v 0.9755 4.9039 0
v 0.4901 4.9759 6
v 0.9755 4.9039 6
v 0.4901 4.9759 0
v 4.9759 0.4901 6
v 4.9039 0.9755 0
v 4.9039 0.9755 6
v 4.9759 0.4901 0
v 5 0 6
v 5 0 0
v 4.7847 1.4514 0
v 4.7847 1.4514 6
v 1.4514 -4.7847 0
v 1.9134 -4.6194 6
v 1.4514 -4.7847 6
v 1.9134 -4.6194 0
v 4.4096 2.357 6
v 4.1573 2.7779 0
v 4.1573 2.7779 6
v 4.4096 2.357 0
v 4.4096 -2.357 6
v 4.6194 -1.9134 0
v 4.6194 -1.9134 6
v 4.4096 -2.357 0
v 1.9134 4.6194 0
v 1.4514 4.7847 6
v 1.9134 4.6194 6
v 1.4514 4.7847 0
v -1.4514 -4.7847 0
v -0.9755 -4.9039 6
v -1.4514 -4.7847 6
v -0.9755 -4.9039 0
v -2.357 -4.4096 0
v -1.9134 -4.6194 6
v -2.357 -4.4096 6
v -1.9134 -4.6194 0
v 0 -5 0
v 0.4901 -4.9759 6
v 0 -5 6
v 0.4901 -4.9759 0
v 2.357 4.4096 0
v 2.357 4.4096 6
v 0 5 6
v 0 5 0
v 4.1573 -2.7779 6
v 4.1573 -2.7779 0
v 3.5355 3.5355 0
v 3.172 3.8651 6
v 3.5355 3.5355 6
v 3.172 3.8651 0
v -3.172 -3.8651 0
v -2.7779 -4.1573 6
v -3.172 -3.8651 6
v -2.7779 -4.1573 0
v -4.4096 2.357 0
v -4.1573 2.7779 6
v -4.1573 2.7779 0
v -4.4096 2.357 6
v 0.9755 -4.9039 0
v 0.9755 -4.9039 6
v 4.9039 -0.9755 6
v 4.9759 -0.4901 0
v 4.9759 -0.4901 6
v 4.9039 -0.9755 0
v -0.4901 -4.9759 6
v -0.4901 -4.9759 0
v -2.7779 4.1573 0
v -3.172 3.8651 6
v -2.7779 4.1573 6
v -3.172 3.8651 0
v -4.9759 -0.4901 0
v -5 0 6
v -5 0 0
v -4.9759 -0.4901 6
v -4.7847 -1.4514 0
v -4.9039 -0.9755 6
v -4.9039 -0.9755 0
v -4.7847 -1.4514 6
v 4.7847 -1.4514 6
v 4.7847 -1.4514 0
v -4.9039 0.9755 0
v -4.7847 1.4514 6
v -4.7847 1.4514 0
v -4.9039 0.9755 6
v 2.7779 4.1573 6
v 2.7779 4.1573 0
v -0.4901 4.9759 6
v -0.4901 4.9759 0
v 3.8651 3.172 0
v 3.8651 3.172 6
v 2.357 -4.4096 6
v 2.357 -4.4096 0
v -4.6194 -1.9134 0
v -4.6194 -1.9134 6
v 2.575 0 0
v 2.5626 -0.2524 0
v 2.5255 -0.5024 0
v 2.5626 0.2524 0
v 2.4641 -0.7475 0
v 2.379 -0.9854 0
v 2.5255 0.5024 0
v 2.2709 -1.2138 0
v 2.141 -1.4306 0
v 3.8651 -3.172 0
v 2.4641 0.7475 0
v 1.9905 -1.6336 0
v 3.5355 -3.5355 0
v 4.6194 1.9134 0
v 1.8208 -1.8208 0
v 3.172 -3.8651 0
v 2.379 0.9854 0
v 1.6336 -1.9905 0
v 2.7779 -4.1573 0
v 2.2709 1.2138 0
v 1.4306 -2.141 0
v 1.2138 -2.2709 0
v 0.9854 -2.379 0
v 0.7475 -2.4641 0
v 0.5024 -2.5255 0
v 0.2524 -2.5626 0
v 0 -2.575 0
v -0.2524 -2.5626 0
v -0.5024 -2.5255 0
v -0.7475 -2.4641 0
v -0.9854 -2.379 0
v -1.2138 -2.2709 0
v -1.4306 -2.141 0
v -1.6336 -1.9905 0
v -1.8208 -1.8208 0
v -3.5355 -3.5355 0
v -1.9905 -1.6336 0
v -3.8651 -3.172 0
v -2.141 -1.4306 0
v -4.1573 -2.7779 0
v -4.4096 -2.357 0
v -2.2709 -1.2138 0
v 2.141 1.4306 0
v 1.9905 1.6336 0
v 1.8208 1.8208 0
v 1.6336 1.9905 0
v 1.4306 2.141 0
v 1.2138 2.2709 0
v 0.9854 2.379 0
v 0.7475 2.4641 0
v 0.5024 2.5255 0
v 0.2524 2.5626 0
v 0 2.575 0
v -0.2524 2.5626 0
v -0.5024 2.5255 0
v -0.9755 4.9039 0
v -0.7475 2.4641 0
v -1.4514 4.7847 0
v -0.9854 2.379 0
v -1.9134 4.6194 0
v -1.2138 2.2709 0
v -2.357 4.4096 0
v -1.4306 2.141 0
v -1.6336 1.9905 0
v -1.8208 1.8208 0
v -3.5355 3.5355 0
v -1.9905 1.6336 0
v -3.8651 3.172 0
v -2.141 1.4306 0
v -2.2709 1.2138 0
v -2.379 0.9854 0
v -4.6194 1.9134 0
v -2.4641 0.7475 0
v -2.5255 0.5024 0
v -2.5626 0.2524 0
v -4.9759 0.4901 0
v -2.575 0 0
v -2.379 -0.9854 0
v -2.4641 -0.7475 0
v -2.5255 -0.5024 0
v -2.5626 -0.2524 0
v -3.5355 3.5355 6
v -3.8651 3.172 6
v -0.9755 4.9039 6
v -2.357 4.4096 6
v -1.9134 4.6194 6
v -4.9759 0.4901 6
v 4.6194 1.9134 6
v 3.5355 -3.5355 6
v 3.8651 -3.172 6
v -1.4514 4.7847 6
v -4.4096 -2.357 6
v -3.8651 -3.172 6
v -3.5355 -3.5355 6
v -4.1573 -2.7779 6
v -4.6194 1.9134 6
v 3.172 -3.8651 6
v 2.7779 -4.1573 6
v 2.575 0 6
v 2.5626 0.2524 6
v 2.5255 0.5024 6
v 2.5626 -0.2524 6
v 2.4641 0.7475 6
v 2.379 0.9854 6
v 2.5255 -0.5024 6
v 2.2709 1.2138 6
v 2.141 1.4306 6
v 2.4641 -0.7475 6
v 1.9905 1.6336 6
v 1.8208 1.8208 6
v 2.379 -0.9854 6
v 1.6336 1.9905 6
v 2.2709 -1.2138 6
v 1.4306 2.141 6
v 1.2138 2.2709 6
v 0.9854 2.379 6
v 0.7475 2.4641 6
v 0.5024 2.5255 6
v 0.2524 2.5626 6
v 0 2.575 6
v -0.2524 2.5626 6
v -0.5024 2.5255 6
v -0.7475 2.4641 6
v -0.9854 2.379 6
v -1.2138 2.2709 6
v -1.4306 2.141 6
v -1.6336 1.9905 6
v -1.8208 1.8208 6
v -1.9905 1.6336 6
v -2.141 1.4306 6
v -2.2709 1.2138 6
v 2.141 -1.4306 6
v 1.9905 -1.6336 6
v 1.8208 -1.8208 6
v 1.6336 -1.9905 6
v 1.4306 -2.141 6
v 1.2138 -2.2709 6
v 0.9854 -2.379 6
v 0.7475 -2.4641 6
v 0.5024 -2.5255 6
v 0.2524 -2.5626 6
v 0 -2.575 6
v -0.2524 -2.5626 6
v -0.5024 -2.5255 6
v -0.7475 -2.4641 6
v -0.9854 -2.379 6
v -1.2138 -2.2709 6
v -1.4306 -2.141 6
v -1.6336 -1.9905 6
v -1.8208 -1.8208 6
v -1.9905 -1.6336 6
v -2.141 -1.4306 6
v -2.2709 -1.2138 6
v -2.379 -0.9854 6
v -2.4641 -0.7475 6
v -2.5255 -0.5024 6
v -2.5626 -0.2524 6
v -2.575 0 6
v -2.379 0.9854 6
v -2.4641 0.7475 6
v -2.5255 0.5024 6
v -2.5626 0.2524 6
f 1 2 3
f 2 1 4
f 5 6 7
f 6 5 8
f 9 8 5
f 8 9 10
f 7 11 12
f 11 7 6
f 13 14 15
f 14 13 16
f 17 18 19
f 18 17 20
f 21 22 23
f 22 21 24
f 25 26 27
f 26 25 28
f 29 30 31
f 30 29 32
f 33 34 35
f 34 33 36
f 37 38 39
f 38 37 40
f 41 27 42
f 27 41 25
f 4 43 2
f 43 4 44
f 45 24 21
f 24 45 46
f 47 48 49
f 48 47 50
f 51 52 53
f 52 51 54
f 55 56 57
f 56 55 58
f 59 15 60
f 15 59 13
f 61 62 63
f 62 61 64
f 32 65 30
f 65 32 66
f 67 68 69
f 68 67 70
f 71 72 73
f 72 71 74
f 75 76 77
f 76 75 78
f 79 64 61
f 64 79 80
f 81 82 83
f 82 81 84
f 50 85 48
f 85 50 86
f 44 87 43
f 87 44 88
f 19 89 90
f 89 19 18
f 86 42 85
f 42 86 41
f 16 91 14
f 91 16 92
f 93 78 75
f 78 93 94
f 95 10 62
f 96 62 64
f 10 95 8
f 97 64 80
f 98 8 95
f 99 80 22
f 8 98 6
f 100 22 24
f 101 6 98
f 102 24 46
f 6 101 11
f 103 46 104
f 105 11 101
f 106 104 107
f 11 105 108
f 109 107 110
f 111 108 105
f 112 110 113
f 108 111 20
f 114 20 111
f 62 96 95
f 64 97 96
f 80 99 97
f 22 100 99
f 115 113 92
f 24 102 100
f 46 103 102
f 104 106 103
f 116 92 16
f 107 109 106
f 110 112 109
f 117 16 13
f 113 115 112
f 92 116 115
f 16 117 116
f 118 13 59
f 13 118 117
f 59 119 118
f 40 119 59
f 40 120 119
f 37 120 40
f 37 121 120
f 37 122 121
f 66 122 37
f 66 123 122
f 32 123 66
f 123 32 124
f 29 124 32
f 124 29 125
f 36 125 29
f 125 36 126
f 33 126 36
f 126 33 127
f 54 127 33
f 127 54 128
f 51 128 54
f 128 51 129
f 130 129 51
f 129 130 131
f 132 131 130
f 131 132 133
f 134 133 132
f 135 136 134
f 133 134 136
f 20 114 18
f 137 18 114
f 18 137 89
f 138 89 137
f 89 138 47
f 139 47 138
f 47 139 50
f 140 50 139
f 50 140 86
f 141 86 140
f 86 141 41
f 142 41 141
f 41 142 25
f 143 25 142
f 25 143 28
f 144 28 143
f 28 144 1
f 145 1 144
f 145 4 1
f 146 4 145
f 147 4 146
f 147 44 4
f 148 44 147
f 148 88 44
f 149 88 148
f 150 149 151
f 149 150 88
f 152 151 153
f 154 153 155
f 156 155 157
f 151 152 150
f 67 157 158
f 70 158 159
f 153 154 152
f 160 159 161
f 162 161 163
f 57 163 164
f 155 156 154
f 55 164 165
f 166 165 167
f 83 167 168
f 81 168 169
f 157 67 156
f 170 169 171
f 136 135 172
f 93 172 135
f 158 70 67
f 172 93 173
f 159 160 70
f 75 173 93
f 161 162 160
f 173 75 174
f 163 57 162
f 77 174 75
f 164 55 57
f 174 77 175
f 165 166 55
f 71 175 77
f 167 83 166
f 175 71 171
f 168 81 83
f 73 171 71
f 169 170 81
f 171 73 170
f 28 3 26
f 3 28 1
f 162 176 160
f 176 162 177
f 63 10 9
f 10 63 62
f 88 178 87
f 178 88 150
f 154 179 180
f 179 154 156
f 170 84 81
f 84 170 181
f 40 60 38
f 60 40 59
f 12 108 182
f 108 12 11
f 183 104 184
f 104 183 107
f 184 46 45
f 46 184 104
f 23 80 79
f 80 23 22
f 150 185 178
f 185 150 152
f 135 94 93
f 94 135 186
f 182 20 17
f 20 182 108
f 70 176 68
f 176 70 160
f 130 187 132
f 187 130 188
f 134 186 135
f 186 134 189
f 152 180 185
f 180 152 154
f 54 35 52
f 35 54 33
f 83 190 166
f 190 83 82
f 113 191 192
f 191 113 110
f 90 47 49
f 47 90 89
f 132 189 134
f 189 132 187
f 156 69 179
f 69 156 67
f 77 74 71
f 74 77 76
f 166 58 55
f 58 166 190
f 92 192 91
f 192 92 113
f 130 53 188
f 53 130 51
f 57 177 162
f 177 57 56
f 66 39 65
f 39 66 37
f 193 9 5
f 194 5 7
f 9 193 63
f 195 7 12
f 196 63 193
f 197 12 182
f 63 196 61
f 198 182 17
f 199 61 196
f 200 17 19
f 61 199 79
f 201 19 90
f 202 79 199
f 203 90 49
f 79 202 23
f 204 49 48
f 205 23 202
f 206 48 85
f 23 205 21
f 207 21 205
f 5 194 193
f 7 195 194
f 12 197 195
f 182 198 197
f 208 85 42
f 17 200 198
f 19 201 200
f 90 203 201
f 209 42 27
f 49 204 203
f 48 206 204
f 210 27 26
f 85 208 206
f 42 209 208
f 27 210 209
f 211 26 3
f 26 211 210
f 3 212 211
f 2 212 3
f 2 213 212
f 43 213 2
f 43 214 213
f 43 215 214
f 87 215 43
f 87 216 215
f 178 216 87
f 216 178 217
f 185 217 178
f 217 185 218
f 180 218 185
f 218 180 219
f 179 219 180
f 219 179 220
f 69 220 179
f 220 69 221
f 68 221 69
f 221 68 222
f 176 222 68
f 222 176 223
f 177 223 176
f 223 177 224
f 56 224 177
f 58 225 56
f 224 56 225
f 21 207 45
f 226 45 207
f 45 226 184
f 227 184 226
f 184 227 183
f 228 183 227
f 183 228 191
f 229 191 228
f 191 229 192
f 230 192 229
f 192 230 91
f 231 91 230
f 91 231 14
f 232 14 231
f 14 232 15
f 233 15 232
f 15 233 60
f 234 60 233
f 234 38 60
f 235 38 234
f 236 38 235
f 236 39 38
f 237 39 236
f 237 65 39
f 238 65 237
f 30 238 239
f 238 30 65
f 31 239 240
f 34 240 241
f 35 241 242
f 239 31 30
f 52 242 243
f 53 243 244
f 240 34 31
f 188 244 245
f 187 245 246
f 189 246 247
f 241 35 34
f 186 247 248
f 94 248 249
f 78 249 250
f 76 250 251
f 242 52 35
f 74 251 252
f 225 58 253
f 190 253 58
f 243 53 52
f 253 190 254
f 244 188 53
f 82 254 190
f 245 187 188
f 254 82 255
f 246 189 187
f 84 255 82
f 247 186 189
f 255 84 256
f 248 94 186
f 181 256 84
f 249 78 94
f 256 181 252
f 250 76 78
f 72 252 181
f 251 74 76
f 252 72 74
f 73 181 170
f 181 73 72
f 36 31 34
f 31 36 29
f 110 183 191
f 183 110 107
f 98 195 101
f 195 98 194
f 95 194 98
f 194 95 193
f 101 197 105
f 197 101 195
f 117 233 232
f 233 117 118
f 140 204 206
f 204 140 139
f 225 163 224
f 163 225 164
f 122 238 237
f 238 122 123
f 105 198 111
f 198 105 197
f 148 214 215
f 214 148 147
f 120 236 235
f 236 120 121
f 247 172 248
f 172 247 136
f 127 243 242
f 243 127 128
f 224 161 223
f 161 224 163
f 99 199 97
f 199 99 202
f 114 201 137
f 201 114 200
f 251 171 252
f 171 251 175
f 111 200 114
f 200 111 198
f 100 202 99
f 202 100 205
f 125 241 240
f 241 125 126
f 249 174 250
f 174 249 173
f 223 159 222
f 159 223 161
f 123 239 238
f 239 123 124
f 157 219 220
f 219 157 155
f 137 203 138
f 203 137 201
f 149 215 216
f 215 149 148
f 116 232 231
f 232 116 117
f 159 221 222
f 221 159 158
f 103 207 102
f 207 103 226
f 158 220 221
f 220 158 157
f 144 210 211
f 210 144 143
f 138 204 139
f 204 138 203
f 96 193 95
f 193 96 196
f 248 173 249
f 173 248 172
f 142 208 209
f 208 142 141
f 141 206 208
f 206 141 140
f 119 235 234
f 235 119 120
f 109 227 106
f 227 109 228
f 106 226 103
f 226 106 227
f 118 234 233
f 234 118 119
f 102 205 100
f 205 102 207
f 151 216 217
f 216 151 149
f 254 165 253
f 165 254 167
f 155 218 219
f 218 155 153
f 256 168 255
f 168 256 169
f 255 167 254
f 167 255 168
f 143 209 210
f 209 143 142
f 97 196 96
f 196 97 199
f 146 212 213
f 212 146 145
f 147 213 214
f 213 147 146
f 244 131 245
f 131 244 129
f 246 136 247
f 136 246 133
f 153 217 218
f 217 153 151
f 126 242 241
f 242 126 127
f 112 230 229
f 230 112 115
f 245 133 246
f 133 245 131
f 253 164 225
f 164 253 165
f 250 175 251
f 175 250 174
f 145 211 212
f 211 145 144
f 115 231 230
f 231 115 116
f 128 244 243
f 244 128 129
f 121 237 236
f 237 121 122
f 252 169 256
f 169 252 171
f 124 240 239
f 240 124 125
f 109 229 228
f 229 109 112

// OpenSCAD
// Cylinder with a centered hole. Units: millimetres.
// The hole opens at the top. Through bottom also opens the bottom face.
// Bottom margin is the floor thickness and is ignored when the hole goes through.
// Use F6 Render before exporting STL or 3MF.

/* [Hole] */
// Through bottom
through_bottom = true;
// Bottom margin, ignored when the hole goes through
hole_bottom_margin = 1; // [0:0.01:50]
// Diameter
hole_diameter = 5.15; // [0.2:0.01:50]

/* [Outer cylinder] */
// Diameter
outer_diameter = 10; // [0.4:0.01:100]
// Height
height = 6; // [0.2:0.01:100]

/* [Quality] */
// Circle segments
fn = 64; // [6:1:128]

/* [Hidden] */
eps = 0.02;

module cylinder_with_hole(
    outer_diameter,
    height,
    hole_diameter,
    through_bottom,
    hole_bottom_margin,
    fn,
    eps
) {
    assert(outer_diameter > 0 && height > 0, "Outer diameter and height must be > 0");
    assert(hole_diameter > 0, "Hole diameter must be > 0");
    assert(hole_diameter < outer_diameter, "Hole diameter must be smaller than the outer diameter");
    assert(hole_bottom_margin >= 0, "Hole bottom margin must be >= 0");
    assert(through_bottom || hole_bottom_margin > 0, "Blind hole needs a bottom margin greater than 0");
    assert(through_bottom || hole_bottom_margin < height, "Bottom margin must be less than the height");
    assert(fn >= 3, "Circle segments must be at least 3");

    difference() {
        cylinder(h = height, d = outer_diameter, $fn = fn);
        if (through_bottom)
            translate([0, 0, -eps])
                cylinder(h = height + 2 * eps, d = hole_diameter, $fn = fn);
        else
            translate([0, 0, hole_bottom_margin])
                cylinder(h = height - hole_bottom_margin + eps, d = hole_diameter, $fn = fn);
    }
}

cylinder_with_hole(
    outer_diameter,
    height,
    hole_diameter,
    through_bottom,
    hole_bottom_margin,
    fn,
    eps
);
